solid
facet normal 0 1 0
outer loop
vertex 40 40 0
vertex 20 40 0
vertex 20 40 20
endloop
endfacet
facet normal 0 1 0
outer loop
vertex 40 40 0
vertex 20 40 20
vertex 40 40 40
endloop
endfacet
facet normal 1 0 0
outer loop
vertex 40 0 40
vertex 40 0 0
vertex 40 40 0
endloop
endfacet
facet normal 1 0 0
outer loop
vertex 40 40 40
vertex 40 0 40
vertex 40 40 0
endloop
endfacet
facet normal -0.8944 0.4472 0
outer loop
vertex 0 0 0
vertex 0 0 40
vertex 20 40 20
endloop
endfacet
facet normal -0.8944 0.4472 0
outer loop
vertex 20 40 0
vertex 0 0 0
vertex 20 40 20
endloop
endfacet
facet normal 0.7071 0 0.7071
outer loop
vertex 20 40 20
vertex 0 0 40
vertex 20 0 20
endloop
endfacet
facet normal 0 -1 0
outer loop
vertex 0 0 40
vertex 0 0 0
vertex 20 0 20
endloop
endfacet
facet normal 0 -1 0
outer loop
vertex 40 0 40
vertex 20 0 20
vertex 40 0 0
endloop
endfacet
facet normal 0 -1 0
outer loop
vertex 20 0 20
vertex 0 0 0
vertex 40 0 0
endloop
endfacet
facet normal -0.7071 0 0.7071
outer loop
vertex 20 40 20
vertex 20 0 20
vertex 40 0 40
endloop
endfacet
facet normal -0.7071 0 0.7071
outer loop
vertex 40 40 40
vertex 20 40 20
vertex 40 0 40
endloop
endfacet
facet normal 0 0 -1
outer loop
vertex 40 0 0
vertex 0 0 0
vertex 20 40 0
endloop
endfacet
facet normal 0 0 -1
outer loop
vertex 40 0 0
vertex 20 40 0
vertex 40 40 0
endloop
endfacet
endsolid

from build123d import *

# Parameters (mm, degrees)
SKETCH1_W           = 40
SKETCH1_H           = 40
BOSS_EXTRUDE1_DEPTH = 40
CUT_EXTRUDE1_DEPTH  = 40
CUT_EXTRUDE2_DEPTH  = 40


with BuildPart() as part:
    # Sketch1 → Boss-Extrude1 (new body)
    with BuildSketch(Plane.XY):
        with Locations((20, 20)):
            Rectangle(SKETCH1_W, SKETCH1_H)
    extrude(amount=BOSS_EXTRUDE1_DEPTH)

    # Sketch2 → Cut-Extrude1 (cut)
    with BuildSketch(Plane.XY.offset(40)):
        Polygon((0, 0), (20, 40), (0, 40), align=None)
    extrude(amount=-CUT_EXTRUDE1_DEPTH, mode=Mode.SUBTRACT)

    # Sketch3 → Cut-Extrude2 (cut)
    with BuildSketch(Plane.XZ):
        Polygon((0, 40), (20, 20), (40, 40), align=None)
    extrude(amount=-CUT_EXTRUDE2_DEPTH, mode=Mode.SUBTRACT)


solid = part.part
